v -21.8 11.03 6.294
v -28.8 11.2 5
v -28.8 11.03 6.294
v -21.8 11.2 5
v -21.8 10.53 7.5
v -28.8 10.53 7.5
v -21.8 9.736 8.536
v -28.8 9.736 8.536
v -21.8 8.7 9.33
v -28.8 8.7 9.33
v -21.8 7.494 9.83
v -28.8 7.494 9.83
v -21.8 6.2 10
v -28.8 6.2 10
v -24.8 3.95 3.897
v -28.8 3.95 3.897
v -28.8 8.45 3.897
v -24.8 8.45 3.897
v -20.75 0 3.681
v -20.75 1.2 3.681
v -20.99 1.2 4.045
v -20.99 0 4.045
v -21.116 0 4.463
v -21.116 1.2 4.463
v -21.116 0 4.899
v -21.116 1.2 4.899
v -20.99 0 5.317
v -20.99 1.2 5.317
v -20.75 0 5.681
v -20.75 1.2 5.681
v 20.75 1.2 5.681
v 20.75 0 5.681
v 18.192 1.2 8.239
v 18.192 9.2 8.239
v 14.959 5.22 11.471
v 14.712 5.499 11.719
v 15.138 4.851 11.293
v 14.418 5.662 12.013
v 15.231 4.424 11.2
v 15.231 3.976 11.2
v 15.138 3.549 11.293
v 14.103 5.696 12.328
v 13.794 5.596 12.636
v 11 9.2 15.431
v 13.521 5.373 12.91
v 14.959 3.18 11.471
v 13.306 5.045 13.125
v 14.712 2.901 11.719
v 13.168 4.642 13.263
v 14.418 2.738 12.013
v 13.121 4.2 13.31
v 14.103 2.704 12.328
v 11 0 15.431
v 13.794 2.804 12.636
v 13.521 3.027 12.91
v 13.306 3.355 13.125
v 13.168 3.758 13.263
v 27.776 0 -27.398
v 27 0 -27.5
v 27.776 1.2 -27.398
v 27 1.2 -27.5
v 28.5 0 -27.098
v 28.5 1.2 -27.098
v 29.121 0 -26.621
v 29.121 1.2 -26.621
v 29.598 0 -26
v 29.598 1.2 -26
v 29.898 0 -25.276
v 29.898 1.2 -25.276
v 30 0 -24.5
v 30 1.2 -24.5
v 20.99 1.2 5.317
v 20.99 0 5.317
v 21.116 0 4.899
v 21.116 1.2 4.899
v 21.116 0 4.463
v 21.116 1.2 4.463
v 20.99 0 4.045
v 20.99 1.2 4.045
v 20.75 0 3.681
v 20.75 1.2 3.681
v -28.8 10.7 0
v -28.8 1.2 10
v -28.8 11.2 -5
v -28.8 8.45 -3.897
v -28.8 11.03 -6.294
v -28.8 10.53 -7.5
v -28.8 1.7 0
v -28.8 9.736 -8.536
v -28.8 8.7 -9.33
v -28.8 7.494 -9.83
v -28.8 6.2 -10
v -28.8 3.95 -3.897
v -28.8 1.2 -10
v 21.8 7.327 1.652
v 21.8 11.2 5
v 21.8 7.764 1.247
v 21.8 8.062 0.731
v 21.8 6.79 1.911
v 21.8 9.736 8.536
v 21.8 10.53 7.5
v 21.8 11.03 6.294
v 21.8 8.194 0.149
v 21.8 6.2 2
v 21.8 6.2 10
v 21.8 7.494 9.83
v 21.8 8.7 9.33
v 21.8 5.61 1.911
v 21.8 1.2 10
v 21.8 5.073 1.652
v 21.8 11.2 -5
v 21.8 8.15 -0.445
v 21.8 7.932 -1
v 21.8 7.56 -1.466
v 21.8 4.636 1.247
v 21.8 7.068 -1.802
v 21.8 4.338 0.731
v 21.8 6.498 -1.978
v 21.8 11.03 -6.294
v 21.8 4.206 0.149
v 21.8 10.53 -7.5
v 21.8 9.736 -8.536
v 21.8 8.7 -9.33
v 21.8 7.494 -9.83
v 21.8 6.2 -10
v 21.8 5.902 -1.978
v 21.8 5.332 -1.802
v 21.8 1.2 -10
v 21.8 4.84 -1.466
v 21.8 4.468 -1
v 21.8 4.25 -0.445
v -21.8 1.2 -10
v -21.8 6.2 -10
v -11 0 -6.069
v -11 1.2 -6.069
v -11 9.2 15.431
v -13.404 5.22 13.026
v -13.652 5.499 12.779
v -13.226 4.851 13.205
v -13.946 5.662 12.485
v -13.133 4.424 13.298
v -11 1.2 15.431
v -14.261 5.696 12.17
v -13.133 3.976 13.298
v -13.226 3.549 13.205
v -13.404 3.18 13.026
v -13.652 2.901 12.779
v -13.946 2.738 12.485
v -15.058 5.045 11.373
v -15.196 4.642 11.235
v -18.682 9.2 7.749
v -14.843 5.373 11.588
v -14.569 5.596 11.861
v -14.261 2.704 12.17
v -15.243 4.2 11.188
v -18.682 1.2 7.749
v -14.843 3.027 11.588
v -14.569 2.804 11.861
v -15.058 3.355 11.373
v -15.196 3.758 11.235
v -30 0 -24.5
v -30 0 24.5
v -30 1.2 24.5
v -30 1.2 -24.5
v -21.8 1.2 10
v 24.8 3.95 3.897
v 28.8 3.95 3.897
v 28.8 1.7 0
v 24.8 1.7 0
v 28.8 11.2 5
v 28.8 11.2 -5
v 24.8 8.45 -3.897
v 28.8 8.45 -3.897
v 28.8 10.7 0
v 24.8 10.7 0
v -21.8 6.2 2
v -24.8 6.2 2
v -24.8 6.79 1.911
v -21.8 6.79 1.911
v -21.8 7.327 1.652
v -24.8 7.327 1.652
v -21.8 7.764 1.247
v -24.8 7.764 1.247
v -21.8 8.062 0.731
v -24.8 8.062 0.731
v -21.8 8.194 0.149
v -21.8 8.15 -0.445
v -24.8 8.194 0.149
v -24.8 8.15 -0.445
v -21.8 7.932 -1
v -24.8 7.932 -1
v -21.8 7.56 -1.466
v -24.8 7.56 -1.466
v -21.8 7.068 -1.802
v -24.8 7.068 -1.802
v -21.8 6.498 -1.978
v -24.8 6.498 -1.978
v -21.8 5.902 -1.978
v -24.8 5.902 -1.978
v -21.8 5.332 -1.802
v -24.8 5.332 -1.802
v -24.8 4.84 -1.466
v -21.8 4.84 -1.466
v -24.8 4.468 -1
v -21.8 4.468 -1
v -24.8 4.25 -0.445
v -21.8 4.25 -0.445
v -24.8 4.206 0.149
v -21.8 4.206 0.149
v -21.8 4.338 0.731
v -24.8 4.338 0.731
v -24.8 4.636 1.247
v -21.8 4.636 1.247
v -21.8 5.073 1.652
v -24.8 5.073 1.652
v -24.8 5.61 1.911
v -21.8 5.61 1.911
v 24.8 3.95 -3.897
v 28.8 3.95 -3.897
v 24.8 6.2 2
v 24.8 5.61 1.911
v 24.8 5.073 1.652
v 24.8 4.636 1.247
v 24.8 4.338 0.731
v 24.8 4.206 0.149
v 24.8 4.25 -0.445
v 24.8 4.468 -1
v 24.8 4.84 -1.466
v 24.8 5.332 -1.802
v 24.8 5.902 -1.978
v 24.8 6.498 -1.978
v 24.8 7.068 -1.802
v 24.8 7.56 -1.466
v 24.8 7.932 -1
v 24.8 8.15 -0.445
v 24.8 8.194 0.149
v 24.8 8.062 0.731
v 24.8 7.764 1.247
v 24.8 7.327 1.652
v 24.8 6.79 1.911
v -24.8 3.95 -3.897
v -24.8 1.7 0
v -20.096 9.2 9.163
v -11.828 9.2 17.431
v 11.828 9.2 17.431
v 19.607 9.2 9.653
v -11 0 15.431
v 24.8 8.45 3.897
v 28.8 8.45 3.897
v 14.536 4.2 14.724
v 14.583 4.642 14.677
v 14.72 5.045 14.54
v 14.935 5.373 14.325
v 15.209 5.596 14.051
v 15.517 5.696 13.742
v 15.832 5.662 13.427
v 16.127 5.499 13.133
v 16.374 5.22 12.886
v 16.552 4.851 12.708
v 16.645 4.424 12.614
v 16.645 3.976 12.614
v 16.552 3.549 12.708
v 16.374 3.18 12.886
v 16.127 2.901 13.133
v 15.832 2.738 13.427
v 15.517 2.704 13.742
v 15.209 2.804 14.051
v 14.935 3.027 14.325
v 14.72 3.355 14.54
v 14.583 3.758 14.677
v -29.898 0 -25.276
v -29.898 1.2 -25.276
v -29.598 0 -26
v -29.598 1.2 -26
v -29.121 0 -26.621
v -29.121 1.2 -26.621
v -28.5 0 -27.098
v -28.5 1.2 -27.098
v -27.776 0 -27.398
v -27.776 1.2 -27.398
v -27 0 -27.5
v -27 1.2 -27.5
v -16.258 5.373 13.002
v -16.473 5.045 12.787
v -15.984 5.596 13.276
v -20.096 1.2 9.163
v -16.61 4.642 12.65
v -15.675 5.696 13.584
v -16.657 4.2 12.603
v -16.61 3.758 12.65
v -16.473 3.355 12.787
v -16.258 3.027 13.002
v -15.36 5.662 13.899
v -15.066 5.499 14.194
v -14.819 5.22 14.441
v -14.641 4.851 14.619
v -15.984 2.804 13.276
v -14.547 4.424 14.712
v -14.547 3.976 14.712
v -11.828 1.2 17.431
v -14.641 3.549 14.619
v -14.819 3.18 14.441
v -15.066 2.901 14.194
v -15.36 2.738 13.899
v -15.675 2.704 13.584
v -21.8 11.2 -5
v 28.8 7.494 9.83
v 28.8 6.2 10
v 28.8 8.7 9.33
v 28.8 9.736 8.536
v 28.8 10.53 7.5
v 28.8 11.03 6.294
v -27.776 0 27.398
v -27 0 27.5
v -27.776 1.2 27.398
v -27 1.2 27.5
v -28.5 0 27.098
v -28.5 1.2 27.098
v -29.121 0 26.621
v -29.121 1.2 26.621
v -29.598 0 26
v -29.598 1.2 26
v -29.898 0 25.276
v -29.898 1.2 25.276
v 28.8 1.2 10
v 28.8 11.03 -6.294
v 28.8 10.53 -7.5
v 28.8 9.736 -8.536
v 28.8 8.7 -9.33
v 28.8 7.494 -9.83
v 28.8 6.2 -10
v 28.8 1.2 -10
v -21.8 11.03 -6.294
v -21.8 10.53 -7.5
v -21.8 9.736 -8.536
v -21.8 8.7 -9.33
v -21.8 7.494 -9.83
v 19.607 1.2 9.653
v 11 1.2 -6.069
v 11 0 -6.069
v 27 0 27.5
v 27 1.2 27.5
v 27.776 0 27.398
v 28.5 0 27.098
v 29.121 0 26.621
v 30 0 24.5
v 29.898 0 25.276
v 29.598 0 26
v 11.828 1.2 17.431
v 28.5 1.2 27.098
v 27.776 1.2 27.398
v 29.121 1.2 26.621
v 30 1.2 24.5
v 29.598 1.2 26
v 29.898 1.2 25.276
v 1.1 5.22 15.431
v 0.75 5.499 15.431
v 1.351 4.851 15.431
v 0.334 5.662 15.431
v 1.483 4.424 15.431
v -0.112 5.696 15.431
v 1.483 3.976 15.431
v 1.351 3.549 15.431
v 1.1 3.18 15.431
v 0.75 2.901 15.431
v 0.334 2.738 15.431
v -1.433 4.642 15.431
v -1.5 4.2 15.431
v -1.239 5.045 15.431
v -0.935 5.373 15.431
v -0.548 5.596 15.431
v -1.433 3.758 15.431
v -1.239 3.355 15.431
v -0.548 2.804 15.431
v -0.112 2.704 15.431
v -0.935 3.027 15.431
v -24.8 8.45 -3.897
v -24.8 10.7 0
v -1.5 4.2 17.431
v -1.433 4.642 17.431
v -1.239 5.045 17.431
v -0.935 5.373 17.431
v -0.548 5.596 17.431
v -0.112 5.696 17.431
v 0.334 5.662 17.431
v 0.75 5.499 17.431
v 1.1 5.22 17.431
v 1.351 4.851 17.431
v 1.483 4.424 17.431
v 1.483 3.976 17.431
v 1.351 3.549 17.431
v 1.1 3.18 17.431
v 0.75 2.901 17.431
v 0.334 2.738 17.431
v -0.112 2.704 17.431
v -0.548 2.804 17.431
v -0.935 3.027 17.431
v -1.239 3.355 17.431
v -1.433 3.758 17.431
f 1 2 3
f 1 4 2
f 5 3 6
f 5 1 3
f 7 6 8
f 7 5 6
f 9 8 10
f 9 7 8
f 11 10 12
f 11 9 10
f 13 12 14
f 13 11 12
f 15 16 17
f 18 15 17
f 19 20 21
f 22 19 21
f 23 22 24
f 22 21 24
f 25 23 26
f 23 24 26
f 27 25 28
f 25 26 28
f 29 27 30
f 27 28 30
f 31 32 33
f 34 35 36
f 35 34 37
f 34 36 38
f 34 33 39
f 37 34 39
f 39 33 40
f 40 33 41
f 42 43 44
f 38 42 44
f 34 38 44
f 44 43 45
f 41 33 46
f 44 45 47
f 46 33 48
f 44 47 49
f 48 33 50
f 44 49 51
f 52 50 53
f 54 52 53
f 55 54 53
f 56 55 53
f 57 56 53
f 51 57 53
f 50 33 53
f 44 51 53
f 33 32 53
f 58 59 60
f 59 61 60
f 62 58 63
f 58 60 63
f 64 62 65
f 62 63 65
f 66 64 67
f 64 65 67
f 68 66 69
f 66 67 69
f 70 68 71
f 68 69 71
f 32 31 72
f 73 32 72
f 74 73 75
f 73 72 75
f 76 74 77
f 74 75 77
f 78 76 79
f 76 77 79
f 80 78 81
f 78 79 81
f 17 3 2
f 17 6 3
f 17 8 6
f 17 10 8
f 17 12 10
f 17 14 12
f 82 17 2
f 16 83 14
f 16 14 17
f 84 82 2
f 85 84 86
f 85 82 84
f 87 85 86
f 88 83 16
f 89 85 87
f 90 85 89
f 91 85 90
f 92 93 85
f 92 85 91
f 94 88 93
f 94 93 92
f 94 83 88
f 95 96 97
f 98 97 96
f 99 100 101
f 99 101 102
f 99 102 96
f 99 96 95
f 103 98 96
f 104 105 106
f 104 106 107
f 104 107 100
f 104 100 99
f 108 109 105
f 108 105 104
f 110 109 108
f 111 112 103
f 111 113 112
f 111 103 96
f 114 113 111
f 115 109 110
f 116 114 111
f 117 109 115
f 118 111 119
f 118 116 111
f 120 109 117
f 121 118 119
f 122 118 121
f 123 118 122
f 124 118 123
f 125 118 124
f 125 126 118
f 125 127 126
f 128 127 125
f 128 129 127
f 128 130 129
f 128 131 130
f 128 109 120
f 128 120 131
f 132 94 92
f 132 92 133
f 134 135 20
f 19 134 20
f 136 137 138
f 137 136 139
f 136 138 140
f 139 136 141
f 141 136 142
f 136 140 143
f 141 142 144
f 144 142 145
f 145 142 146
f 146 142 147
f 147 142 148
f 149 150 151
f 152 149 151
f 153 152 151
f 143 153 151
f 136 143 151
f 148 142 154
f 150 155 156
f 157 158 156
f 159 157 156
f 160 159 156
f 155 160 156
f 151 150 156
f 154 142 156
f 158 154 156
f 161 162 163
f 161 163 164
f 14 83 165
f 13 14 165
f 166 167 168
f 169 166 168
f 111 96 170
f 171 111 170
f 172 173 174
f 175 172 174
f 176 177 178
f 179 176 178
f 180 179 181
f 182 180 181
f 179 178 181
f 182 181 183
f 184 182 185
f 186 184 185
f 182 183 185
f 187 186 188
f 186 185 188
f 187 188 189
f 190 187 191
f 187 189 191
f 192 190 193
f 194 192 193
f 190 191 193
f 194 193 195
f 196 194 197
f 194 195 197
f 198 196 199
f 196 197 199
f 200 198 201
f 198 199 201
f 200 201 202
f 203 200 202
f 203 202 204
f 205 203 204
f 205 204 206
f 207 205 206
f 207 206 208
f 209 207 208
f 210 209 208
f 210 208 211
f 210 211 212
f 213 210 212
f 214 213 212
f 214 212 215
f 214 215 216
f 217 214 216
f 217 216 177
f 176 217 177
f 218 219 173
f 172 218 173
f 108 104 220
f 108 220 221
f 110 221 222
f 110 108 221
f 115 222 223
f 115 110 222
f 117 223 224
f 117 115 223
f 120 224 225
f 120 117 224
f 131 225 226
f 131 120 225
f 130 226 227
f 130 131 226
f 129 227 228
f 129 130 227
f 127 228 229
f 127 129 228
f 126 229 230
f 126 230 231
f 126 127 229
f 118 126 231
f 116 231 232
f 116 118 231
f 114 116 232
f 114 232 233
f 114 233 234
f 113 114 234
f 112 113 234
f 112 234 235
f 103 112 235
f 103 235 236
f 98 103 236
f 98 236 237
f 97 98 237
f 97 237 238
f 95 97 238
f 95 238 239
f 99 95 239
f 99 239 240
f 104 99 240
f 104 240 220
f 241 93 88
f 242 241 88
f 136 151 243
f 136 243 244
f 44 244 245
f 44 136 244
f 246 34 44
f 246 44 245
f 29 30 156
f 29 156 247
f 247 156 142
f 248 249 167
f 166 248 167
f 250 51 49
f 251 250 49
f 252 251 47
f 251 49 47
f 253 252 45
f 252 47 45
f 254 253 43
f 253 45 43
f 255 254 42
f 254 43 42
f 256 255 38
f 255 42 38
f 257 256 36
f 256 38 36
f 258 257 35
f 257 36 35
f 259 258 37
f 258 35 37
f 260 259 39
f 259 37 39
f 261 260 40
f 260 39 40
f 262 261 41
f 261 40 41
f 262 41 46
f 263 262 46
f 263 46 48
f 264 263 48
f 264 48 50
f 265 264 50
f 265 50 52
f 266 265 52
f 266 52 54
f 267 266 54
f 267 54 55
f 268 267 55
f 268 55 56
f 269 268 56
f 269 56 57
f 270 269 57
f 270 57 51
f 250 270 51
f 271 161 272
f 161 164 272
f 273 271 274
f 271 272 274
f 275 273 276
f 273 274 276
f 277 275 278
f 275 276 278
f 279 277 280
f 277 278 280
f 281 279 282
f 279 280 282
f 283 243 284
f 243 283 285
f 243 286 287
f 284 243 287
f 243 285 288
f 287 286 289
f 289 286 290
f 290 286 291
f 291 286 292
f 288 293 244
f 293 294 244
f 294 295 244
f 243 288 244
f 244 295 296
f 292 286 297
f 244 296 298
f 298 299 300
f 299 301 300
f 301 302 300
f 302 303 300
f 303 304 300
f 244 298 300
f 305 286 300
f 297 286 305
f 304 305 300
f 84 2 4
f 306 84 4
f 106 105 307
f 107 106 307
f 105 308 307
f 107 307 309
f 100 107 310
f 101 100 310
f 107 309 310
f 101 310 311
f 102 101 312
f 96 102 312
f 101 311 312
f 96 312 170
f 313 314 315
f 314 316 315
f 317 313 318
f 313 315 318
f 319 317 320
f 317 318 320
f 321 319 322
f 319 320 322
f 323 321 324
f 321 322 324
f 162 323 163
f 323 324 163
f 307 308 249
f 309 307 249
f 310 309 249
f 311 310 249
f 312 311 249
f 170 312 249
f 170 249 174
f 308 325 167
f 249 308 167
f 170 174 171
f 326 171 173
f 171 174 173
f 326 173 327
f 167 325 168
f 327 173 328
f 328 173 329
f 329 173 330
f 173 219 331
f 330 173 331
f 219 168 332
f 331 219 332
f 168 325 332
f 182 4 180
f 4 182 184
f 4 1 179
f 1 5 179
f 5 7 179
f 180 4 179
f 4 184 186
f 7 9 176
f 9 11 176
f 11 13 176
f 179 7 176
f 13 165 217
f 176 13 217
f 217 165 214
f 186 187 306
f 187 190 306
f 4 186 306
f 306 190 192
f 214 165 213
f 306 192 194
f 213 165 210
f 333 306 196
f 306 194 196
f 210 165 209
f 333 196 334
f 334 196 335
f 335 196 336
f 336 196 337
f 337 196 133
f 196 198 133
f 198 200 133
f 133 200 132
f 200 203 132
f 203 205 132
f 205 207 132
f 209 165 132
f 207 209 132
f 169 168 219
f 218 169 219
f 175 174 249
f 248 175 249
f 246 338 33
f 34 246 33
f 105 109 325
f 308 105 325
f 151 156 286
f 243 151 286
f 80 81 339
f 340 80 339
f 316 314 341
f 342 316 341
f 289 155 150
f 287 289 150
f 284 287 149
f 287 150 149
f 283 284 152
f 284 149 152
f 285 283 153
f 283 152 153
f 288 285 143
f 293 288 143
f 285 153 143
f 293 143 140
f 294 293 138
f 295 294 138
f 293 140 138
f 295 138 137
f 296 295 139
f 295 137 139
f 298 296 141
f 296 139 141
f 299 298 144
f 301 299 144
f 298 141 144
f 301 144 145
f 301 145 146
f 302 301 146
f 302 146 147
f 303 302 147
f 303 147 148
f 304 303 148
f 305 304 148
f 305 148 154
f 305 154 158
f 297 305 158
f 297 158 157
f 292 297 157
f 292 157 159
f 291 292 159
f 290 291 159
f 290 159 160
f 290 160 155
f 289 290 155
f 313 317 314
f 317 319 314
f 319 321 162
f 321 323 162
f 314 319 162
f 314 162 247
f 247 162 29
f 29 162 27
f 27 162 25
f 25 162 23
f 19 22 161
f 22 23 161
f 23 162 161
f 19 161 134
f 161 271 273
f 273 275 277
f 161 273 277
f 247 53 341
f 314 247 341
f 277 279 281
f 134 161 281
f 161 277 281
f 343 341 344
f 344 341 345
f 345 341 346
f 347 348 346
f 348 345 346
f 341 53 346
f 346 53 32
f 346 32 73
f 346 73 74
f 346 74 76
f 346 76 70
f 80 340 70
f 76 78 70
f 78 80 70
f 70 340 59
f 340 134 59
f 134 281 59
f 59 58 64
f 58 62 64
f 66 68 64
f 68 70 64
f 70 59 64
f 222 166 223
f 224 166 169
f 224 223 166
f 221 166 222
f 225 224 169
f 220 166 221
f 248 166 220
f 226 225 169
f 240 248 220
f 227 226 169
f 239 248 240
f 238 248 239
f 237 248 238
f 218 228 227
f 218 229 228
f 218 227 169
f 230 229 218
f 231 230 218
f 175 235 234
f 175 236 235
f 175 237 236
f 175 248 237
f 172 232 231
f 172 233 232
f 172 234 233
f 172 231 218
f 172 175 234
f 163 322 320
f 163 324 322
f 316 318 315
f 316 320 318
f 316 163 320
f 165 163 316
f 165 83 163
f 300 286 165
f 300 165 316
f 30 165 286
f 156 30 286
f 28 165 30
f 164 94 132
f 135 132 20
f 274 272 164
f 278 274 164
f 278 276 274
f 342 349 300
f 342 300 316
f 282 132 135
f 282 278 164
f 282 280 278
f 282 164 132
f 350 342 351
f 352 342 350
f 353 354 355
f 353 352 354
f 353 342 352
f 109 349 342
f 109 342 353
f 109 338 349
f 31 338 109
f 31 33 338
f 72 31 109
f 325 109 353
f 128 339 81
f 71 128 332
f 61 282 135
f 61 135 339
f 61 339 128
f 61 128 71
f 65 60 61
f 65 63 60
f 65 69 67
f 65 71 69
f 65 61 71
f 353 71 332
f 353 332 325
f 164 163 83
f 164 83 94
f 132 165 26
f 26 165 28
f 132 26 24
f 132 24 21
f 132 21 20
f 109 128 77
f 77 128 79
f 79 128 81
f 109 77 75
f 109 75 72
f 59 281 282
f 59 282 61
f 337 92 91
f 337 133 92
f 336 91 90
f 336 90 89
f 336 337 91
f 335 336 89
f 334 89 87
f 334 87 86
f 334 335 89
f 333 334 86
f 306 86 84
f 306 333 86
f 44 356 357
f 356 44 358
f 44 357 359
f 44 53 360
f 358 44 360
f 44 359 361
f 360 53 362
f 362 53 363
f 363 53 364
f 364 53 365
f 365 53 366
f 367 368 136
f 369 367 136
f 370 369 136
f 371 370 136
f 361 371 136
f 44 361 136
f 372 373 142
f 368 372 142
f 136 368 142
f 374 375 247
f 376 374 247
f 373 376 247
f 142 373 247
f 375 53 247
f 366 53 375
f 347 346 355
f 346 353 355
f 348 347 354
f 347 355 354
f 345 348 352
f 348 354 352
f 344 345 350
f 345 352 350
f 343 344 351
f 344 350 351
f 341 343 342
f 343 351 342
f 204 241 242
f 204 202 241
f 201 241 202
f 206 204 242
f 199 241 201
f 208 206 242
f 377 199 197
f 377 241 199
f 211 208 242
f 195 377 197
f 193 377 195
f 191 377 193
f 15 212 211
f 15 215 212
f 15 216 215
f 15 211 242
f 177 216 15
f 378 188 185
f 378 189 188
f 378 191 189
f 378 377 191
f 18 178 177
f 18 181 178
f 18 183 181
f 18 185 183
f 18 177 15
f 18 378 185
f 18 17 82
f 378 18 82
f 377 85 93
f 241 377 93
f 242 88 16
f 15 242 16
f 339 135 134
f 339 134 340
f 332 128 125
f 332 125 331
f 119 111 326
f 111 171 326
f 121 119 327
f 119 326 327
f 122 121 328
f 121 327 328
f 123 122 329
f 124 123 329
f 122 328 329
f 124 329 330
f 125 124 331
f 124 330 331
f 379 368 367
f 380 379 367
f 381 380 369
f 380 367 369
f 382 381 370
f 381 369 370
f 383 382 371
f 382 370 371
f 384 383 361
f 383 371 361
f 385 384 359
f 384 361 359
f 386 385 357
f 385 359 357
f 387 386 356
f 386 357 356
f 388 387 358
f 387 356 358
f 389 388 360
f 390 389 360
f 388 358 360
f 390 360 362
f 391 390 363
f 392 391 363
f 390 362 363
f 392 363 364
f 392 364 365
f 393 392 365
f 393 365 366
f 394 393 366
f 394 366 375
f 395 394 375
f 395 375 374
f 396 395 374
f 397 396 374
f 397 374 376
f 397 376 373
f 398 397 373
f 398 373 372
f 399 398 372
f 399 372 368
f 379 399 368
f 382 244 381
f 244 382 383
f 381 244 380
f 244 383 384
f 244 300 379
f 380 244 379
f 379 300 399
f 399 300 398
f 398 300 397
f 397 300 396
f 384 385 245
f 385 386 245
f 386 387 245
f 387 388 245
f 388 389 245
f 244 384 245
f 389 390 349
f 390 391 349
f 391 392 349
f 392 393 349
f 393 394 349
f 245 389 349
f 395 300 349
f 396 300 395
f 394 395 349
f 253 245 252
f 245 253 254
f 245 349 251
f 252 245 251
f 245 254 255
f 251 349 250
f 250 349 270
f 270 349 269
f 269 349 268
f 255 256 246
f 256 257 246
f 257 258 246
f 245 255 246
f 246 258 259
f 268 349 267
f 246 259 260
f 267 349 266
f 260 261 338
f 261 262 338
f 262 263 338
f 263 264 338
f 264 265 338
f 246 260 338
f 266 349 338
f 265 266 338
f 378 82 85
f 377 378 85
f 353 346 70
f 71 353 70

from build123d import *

# Parameters (mm, degrees)
ESBO_O1_W                = 60
ESBO_O1_H                = 55
RESSALTO_EXTRUS_O1_DEPTH = 1.2
ESBO_O2_W                = 22
ESBO_O2_H                = 21.5
CORTE_EXTRUS_O1_DEPTH    = 41.714739346
RESSALTO_EXTRUS_O2_DEPTH = 8
ESBO_O4_R                = 1.5
CORTE_EXTRUS_O2_DEPTH    = 7
ESBO_O5_R                = 1.5
CORTE_EXTRUS_O3_DEPTH    = 7
ESBO_O6_R                = 1.5
CORTE_EXTRUS_O4_DEPTH    = 7
FILETE1_R                = 3
FILETE2_R                = 3
FILETE3_R                = 3
FILETE4_R                = 3
ESBO_O8_W                = 7
ESBO_O8_H                = 20
RESSALTO_EXTRUS_O3_DEPTH = 10
CORTE_EXTRUS_O6_DEPTH    = 4
ESBO_O11_R               = 2
CORTE_EXTRUS_O7_DEPTH    = 10
CORTE_EXTRUS_O8_DEPTH    = 4
CORTE_EXTRUS_O9_START    = -10
ESBO_O13_R               = 2
CORTE_EXTRUS_O9_DEPTH    = 10
FILETE5_R                = 5
FILETE6_R                = 5
FILETE7_R                = 5
FILETE9_R                = 5


with BuildPart() as part:
    # Esboço1 → Ressalto-extrusão1 (new body)
    with BuildSketch(Plane(origin=(0, 0, 0), x_dir=(1, 0, 0), z_dir=(0, 1, 0))):
        Rectangle(ESBO_O1_W, ESBO_O1_H)
    extrude(amount=RESSALTO_EXTRUS_O1_DEPTH)

    # Esboço2 → Corte-extrusão1 (cut, through all)
    with BuildSketch(Plane(origin=(0, 1.2, 0), x_dir=(1, 0, 0), z_dir=(0, 1, 0))):
        with Locations((0, -4.680960194)):
            Rectangle(ESBO_O2_W, ESBO_O2_H)
        with BuildLine():
            Line((-20.75, -5.680960194), (-11, -15.430960194))
            Line((-11, -15.430960194), (-11, 6.069039806))
            Line((-11, 6.069039806), (-20.75, -3.680960194))
            ThreePointArc((-20.75, -3.680960194), (-21.131966011, -4.680960194), (-20.75, -5.680960194))
        make_face()
        with BuildLine():
            Line((11, 6.069039806), (11, -15.430960194))
            Line((11, -15.430960194), (20.75, -5.680960194))
            ThreePointArc((20.75, -5.680960194), (21.131966011, -4.680960194), (20.75, -3.680960194))
            Line((20.75, -3.680960194), (11, 6.069039806))
        make_face()
    extrude(amount=-CORTE_EXTRUS_O1_DEPTH, mode=Mode.SUBTRACT)

    # Esboço3 → Ressalto-extrusão2 (add)
    with BuildSketch(Plane(origin=(0, 1.2, 0), x_dir=(1, 0, 0), z_dir=(0, 1, 0))):
        Polygon((-10.998427125, -17.430960194), (10.998427125, -17.430960194), (11.828427125, -17.430960194), (19.606601718, -9.652785601), (18.192388155, -8.238572039), (11, -15.430960194), (-11, -15.430960194), (-18.681875297, -7.749084898), (-20.096088859, -9.16329846), (-11.828427125, -17.430960194), align=None)
    extrude(amount=RESSALTO_EXTRUS_O2_DEPTH)

    # Esboço4 → Corte-extrusão2 (cut)
    with BuildSketch(Plane(origin=(13.215480097, 0, 13.215480097), x_dir=(-0.7071067811865465, 0, 0.7071067811865487), z_dir=(-0.7071067811865487, 0, -0.7071067811865465))):
        with Locations((-1.366837999, 4.2)):
            Circle(ESBO_O4_R)
    extrude(amount=-CORTE_EXTRUS_O2_DEPTH, mode=Mode.SUBTRACT)

    # Esboço5 → Corte-extrusão3 (cut)
    with BuildSketch(Plane(origin=(0, 0, 15.430960194), x_dir=(-1, 0, 0), z_dir=(0, 0, -1))):
        with Locations((0, 4.2)):
            Circle(ESBO_O5_R)
    extrude(amount=-CORTE_EXTRUS_O3_DEPTH, mode=Mode.SUBTRACT)

    # Esboço6 → Corte-extrusão4 (cut)
    with BuildSketch(Plane(origin=(-13.215480097, 0, 13.215480097), x_dir=(-0.7071067811865466, 0, -0.7071067811865485), z_dir=(0.7071067811865485, 0, -0.7071067811865466))):
        with Locations((1.366837999, 4.2)):
            Circle(ESBO_O6_R)
    extrude(amount=-CORTE_EXTRUS_O4_DEPTH, mode=Mode.SUBTRACT)

    # Filete1
    filete1_edges = [part.edges().sort_by_distance(p)[0] for p in [
        (-30, 0.6, -27.5),
    ]]
    fillet(filete1_edges, radius=FILETE1_R)

    # Filete2
    filete2_edges = [part.edges().sort_by_distance(p)[0] for p in [
        (30, 0.6, -27.5),
    ]]
    fillet(filete2_edges, radius=FILETE2_R)

    # Filete3
    filete3_edges = [part.edges().sort_by_distance(p)[0] for p in [
        (30, 0.6, 27.5),
    ]]
    fillet(filete3_edges, radius=FILETE3_R)

    # Filete4
    filete4_edges = [part.edges().sort_by_distance(p)[0] for p in [
        (-30, 0.6, 27.5),
    ]]
    fillet(filete4_edges, radius=FILETE4_R)

    # Esboço8 → Ressalto-extrusão3 (add)
    with BuildSketch(Plane(origin=(0, 1.2, 0), x_dir=(1, 0, 0), z_dir=(0, 1, 0))):
        with Locations((-25.3, 0)):
            Rectangle(ESBO_O8_W, ESBO_O8_H)
        with Locations((25.3, 0)):
            Rectangle(ESBO_O8_W, ESBO_O8_H)
    extrude(amount=RESSALTO_EXTRUS_O3_DEPTH)

    # Esboço9 → Corte-extrusão6 (cut)
    with BuildSketch(Plane.ZY.offset(28.8)):
        Polygon((0, 1.7), (3.897114317, 3.95), (3.897114317, 8.45), (0, 10.7), (-3.897114317, 8.45), (-3.897114317, 3.95), align=None)
    extrude(amount=-CORTE_EXTRUS_O6_DEPTH, mode=Mode.SUBTRACT)

    # Esboço11 → Corte-extrusão7 (cut)
    with BuildSketch(Plane.ZY.offset(24.8)):
        with Locations((0, 6.2)):
            Circle(ESBO_O11_R)
    extrude(amount=-CORTE_EXTRUS_O7_DEPTH, mode=Mode.SUBTRACT)

    # Esboço12 → Corte-extrusão8 (cut)
    with BuildSketch(Plane(origin=(28.8, 0, 0), x_dir=(0, 0, -1), z_dir=(1, 0, 0))):
        Polygon((0, 1.7), (3.897114317, 3.95), (3.897114317, 8.45), (0, 10.7), (-3.897114317, 8.45), (-3.897114317, 3.95), align=None)
    extrude(amount=-CORTE_EXTRUS_O8_DEPTH, mode=Mode.SUBTRACT)

    # Esboço13 → Corte-extrusão9 (cut)
    with BuildSketch(Plane(origin=(24.8, 0, 0), x_dir=(0, 0, -1), z_dir=(1, 0, 0)).offset(CORTE_EXTRUS_O9_START)):
        with Locations(Location((0, 6.2, 0), (0, 0, 180))):
            Circle(ESBO_O13_R)
    extrude(amount=CORTE_EXTRUS_O9_DEPTH, mode=Mode.SUBTRACT)

    # Filete5
    filete5_edges = [part.edges().sort_by_distance(p)[0] for p in [
        (25.3, 11.2, 10),
    ]]
    fillet(filete5_edges, radius=FILETE5_R)

    # Filete6
    filete6_edges = [part.edges().sort_by_distance(p)[0] for p in [
        (25.3, 11.2, -10),
    ]]
    fillet(filete6_edges, radius=FILETE6_R)

    # Filete7
    filete7_edges = [part.edges().sort_by_distance(p)[0] for p in [
        (-25.3, 11.2, -10),
    ]]
    fillet(filete7_edges, radius=FILETE7_R)

    # Filete9
    filete9_edges = [part.edges().sort_by_distance(p)[0] for p in [
        (-25.3, 11.2, 10),
    ]]
    fillet(filete9_edges, radius=FILETE9_R)


solid = part.part
